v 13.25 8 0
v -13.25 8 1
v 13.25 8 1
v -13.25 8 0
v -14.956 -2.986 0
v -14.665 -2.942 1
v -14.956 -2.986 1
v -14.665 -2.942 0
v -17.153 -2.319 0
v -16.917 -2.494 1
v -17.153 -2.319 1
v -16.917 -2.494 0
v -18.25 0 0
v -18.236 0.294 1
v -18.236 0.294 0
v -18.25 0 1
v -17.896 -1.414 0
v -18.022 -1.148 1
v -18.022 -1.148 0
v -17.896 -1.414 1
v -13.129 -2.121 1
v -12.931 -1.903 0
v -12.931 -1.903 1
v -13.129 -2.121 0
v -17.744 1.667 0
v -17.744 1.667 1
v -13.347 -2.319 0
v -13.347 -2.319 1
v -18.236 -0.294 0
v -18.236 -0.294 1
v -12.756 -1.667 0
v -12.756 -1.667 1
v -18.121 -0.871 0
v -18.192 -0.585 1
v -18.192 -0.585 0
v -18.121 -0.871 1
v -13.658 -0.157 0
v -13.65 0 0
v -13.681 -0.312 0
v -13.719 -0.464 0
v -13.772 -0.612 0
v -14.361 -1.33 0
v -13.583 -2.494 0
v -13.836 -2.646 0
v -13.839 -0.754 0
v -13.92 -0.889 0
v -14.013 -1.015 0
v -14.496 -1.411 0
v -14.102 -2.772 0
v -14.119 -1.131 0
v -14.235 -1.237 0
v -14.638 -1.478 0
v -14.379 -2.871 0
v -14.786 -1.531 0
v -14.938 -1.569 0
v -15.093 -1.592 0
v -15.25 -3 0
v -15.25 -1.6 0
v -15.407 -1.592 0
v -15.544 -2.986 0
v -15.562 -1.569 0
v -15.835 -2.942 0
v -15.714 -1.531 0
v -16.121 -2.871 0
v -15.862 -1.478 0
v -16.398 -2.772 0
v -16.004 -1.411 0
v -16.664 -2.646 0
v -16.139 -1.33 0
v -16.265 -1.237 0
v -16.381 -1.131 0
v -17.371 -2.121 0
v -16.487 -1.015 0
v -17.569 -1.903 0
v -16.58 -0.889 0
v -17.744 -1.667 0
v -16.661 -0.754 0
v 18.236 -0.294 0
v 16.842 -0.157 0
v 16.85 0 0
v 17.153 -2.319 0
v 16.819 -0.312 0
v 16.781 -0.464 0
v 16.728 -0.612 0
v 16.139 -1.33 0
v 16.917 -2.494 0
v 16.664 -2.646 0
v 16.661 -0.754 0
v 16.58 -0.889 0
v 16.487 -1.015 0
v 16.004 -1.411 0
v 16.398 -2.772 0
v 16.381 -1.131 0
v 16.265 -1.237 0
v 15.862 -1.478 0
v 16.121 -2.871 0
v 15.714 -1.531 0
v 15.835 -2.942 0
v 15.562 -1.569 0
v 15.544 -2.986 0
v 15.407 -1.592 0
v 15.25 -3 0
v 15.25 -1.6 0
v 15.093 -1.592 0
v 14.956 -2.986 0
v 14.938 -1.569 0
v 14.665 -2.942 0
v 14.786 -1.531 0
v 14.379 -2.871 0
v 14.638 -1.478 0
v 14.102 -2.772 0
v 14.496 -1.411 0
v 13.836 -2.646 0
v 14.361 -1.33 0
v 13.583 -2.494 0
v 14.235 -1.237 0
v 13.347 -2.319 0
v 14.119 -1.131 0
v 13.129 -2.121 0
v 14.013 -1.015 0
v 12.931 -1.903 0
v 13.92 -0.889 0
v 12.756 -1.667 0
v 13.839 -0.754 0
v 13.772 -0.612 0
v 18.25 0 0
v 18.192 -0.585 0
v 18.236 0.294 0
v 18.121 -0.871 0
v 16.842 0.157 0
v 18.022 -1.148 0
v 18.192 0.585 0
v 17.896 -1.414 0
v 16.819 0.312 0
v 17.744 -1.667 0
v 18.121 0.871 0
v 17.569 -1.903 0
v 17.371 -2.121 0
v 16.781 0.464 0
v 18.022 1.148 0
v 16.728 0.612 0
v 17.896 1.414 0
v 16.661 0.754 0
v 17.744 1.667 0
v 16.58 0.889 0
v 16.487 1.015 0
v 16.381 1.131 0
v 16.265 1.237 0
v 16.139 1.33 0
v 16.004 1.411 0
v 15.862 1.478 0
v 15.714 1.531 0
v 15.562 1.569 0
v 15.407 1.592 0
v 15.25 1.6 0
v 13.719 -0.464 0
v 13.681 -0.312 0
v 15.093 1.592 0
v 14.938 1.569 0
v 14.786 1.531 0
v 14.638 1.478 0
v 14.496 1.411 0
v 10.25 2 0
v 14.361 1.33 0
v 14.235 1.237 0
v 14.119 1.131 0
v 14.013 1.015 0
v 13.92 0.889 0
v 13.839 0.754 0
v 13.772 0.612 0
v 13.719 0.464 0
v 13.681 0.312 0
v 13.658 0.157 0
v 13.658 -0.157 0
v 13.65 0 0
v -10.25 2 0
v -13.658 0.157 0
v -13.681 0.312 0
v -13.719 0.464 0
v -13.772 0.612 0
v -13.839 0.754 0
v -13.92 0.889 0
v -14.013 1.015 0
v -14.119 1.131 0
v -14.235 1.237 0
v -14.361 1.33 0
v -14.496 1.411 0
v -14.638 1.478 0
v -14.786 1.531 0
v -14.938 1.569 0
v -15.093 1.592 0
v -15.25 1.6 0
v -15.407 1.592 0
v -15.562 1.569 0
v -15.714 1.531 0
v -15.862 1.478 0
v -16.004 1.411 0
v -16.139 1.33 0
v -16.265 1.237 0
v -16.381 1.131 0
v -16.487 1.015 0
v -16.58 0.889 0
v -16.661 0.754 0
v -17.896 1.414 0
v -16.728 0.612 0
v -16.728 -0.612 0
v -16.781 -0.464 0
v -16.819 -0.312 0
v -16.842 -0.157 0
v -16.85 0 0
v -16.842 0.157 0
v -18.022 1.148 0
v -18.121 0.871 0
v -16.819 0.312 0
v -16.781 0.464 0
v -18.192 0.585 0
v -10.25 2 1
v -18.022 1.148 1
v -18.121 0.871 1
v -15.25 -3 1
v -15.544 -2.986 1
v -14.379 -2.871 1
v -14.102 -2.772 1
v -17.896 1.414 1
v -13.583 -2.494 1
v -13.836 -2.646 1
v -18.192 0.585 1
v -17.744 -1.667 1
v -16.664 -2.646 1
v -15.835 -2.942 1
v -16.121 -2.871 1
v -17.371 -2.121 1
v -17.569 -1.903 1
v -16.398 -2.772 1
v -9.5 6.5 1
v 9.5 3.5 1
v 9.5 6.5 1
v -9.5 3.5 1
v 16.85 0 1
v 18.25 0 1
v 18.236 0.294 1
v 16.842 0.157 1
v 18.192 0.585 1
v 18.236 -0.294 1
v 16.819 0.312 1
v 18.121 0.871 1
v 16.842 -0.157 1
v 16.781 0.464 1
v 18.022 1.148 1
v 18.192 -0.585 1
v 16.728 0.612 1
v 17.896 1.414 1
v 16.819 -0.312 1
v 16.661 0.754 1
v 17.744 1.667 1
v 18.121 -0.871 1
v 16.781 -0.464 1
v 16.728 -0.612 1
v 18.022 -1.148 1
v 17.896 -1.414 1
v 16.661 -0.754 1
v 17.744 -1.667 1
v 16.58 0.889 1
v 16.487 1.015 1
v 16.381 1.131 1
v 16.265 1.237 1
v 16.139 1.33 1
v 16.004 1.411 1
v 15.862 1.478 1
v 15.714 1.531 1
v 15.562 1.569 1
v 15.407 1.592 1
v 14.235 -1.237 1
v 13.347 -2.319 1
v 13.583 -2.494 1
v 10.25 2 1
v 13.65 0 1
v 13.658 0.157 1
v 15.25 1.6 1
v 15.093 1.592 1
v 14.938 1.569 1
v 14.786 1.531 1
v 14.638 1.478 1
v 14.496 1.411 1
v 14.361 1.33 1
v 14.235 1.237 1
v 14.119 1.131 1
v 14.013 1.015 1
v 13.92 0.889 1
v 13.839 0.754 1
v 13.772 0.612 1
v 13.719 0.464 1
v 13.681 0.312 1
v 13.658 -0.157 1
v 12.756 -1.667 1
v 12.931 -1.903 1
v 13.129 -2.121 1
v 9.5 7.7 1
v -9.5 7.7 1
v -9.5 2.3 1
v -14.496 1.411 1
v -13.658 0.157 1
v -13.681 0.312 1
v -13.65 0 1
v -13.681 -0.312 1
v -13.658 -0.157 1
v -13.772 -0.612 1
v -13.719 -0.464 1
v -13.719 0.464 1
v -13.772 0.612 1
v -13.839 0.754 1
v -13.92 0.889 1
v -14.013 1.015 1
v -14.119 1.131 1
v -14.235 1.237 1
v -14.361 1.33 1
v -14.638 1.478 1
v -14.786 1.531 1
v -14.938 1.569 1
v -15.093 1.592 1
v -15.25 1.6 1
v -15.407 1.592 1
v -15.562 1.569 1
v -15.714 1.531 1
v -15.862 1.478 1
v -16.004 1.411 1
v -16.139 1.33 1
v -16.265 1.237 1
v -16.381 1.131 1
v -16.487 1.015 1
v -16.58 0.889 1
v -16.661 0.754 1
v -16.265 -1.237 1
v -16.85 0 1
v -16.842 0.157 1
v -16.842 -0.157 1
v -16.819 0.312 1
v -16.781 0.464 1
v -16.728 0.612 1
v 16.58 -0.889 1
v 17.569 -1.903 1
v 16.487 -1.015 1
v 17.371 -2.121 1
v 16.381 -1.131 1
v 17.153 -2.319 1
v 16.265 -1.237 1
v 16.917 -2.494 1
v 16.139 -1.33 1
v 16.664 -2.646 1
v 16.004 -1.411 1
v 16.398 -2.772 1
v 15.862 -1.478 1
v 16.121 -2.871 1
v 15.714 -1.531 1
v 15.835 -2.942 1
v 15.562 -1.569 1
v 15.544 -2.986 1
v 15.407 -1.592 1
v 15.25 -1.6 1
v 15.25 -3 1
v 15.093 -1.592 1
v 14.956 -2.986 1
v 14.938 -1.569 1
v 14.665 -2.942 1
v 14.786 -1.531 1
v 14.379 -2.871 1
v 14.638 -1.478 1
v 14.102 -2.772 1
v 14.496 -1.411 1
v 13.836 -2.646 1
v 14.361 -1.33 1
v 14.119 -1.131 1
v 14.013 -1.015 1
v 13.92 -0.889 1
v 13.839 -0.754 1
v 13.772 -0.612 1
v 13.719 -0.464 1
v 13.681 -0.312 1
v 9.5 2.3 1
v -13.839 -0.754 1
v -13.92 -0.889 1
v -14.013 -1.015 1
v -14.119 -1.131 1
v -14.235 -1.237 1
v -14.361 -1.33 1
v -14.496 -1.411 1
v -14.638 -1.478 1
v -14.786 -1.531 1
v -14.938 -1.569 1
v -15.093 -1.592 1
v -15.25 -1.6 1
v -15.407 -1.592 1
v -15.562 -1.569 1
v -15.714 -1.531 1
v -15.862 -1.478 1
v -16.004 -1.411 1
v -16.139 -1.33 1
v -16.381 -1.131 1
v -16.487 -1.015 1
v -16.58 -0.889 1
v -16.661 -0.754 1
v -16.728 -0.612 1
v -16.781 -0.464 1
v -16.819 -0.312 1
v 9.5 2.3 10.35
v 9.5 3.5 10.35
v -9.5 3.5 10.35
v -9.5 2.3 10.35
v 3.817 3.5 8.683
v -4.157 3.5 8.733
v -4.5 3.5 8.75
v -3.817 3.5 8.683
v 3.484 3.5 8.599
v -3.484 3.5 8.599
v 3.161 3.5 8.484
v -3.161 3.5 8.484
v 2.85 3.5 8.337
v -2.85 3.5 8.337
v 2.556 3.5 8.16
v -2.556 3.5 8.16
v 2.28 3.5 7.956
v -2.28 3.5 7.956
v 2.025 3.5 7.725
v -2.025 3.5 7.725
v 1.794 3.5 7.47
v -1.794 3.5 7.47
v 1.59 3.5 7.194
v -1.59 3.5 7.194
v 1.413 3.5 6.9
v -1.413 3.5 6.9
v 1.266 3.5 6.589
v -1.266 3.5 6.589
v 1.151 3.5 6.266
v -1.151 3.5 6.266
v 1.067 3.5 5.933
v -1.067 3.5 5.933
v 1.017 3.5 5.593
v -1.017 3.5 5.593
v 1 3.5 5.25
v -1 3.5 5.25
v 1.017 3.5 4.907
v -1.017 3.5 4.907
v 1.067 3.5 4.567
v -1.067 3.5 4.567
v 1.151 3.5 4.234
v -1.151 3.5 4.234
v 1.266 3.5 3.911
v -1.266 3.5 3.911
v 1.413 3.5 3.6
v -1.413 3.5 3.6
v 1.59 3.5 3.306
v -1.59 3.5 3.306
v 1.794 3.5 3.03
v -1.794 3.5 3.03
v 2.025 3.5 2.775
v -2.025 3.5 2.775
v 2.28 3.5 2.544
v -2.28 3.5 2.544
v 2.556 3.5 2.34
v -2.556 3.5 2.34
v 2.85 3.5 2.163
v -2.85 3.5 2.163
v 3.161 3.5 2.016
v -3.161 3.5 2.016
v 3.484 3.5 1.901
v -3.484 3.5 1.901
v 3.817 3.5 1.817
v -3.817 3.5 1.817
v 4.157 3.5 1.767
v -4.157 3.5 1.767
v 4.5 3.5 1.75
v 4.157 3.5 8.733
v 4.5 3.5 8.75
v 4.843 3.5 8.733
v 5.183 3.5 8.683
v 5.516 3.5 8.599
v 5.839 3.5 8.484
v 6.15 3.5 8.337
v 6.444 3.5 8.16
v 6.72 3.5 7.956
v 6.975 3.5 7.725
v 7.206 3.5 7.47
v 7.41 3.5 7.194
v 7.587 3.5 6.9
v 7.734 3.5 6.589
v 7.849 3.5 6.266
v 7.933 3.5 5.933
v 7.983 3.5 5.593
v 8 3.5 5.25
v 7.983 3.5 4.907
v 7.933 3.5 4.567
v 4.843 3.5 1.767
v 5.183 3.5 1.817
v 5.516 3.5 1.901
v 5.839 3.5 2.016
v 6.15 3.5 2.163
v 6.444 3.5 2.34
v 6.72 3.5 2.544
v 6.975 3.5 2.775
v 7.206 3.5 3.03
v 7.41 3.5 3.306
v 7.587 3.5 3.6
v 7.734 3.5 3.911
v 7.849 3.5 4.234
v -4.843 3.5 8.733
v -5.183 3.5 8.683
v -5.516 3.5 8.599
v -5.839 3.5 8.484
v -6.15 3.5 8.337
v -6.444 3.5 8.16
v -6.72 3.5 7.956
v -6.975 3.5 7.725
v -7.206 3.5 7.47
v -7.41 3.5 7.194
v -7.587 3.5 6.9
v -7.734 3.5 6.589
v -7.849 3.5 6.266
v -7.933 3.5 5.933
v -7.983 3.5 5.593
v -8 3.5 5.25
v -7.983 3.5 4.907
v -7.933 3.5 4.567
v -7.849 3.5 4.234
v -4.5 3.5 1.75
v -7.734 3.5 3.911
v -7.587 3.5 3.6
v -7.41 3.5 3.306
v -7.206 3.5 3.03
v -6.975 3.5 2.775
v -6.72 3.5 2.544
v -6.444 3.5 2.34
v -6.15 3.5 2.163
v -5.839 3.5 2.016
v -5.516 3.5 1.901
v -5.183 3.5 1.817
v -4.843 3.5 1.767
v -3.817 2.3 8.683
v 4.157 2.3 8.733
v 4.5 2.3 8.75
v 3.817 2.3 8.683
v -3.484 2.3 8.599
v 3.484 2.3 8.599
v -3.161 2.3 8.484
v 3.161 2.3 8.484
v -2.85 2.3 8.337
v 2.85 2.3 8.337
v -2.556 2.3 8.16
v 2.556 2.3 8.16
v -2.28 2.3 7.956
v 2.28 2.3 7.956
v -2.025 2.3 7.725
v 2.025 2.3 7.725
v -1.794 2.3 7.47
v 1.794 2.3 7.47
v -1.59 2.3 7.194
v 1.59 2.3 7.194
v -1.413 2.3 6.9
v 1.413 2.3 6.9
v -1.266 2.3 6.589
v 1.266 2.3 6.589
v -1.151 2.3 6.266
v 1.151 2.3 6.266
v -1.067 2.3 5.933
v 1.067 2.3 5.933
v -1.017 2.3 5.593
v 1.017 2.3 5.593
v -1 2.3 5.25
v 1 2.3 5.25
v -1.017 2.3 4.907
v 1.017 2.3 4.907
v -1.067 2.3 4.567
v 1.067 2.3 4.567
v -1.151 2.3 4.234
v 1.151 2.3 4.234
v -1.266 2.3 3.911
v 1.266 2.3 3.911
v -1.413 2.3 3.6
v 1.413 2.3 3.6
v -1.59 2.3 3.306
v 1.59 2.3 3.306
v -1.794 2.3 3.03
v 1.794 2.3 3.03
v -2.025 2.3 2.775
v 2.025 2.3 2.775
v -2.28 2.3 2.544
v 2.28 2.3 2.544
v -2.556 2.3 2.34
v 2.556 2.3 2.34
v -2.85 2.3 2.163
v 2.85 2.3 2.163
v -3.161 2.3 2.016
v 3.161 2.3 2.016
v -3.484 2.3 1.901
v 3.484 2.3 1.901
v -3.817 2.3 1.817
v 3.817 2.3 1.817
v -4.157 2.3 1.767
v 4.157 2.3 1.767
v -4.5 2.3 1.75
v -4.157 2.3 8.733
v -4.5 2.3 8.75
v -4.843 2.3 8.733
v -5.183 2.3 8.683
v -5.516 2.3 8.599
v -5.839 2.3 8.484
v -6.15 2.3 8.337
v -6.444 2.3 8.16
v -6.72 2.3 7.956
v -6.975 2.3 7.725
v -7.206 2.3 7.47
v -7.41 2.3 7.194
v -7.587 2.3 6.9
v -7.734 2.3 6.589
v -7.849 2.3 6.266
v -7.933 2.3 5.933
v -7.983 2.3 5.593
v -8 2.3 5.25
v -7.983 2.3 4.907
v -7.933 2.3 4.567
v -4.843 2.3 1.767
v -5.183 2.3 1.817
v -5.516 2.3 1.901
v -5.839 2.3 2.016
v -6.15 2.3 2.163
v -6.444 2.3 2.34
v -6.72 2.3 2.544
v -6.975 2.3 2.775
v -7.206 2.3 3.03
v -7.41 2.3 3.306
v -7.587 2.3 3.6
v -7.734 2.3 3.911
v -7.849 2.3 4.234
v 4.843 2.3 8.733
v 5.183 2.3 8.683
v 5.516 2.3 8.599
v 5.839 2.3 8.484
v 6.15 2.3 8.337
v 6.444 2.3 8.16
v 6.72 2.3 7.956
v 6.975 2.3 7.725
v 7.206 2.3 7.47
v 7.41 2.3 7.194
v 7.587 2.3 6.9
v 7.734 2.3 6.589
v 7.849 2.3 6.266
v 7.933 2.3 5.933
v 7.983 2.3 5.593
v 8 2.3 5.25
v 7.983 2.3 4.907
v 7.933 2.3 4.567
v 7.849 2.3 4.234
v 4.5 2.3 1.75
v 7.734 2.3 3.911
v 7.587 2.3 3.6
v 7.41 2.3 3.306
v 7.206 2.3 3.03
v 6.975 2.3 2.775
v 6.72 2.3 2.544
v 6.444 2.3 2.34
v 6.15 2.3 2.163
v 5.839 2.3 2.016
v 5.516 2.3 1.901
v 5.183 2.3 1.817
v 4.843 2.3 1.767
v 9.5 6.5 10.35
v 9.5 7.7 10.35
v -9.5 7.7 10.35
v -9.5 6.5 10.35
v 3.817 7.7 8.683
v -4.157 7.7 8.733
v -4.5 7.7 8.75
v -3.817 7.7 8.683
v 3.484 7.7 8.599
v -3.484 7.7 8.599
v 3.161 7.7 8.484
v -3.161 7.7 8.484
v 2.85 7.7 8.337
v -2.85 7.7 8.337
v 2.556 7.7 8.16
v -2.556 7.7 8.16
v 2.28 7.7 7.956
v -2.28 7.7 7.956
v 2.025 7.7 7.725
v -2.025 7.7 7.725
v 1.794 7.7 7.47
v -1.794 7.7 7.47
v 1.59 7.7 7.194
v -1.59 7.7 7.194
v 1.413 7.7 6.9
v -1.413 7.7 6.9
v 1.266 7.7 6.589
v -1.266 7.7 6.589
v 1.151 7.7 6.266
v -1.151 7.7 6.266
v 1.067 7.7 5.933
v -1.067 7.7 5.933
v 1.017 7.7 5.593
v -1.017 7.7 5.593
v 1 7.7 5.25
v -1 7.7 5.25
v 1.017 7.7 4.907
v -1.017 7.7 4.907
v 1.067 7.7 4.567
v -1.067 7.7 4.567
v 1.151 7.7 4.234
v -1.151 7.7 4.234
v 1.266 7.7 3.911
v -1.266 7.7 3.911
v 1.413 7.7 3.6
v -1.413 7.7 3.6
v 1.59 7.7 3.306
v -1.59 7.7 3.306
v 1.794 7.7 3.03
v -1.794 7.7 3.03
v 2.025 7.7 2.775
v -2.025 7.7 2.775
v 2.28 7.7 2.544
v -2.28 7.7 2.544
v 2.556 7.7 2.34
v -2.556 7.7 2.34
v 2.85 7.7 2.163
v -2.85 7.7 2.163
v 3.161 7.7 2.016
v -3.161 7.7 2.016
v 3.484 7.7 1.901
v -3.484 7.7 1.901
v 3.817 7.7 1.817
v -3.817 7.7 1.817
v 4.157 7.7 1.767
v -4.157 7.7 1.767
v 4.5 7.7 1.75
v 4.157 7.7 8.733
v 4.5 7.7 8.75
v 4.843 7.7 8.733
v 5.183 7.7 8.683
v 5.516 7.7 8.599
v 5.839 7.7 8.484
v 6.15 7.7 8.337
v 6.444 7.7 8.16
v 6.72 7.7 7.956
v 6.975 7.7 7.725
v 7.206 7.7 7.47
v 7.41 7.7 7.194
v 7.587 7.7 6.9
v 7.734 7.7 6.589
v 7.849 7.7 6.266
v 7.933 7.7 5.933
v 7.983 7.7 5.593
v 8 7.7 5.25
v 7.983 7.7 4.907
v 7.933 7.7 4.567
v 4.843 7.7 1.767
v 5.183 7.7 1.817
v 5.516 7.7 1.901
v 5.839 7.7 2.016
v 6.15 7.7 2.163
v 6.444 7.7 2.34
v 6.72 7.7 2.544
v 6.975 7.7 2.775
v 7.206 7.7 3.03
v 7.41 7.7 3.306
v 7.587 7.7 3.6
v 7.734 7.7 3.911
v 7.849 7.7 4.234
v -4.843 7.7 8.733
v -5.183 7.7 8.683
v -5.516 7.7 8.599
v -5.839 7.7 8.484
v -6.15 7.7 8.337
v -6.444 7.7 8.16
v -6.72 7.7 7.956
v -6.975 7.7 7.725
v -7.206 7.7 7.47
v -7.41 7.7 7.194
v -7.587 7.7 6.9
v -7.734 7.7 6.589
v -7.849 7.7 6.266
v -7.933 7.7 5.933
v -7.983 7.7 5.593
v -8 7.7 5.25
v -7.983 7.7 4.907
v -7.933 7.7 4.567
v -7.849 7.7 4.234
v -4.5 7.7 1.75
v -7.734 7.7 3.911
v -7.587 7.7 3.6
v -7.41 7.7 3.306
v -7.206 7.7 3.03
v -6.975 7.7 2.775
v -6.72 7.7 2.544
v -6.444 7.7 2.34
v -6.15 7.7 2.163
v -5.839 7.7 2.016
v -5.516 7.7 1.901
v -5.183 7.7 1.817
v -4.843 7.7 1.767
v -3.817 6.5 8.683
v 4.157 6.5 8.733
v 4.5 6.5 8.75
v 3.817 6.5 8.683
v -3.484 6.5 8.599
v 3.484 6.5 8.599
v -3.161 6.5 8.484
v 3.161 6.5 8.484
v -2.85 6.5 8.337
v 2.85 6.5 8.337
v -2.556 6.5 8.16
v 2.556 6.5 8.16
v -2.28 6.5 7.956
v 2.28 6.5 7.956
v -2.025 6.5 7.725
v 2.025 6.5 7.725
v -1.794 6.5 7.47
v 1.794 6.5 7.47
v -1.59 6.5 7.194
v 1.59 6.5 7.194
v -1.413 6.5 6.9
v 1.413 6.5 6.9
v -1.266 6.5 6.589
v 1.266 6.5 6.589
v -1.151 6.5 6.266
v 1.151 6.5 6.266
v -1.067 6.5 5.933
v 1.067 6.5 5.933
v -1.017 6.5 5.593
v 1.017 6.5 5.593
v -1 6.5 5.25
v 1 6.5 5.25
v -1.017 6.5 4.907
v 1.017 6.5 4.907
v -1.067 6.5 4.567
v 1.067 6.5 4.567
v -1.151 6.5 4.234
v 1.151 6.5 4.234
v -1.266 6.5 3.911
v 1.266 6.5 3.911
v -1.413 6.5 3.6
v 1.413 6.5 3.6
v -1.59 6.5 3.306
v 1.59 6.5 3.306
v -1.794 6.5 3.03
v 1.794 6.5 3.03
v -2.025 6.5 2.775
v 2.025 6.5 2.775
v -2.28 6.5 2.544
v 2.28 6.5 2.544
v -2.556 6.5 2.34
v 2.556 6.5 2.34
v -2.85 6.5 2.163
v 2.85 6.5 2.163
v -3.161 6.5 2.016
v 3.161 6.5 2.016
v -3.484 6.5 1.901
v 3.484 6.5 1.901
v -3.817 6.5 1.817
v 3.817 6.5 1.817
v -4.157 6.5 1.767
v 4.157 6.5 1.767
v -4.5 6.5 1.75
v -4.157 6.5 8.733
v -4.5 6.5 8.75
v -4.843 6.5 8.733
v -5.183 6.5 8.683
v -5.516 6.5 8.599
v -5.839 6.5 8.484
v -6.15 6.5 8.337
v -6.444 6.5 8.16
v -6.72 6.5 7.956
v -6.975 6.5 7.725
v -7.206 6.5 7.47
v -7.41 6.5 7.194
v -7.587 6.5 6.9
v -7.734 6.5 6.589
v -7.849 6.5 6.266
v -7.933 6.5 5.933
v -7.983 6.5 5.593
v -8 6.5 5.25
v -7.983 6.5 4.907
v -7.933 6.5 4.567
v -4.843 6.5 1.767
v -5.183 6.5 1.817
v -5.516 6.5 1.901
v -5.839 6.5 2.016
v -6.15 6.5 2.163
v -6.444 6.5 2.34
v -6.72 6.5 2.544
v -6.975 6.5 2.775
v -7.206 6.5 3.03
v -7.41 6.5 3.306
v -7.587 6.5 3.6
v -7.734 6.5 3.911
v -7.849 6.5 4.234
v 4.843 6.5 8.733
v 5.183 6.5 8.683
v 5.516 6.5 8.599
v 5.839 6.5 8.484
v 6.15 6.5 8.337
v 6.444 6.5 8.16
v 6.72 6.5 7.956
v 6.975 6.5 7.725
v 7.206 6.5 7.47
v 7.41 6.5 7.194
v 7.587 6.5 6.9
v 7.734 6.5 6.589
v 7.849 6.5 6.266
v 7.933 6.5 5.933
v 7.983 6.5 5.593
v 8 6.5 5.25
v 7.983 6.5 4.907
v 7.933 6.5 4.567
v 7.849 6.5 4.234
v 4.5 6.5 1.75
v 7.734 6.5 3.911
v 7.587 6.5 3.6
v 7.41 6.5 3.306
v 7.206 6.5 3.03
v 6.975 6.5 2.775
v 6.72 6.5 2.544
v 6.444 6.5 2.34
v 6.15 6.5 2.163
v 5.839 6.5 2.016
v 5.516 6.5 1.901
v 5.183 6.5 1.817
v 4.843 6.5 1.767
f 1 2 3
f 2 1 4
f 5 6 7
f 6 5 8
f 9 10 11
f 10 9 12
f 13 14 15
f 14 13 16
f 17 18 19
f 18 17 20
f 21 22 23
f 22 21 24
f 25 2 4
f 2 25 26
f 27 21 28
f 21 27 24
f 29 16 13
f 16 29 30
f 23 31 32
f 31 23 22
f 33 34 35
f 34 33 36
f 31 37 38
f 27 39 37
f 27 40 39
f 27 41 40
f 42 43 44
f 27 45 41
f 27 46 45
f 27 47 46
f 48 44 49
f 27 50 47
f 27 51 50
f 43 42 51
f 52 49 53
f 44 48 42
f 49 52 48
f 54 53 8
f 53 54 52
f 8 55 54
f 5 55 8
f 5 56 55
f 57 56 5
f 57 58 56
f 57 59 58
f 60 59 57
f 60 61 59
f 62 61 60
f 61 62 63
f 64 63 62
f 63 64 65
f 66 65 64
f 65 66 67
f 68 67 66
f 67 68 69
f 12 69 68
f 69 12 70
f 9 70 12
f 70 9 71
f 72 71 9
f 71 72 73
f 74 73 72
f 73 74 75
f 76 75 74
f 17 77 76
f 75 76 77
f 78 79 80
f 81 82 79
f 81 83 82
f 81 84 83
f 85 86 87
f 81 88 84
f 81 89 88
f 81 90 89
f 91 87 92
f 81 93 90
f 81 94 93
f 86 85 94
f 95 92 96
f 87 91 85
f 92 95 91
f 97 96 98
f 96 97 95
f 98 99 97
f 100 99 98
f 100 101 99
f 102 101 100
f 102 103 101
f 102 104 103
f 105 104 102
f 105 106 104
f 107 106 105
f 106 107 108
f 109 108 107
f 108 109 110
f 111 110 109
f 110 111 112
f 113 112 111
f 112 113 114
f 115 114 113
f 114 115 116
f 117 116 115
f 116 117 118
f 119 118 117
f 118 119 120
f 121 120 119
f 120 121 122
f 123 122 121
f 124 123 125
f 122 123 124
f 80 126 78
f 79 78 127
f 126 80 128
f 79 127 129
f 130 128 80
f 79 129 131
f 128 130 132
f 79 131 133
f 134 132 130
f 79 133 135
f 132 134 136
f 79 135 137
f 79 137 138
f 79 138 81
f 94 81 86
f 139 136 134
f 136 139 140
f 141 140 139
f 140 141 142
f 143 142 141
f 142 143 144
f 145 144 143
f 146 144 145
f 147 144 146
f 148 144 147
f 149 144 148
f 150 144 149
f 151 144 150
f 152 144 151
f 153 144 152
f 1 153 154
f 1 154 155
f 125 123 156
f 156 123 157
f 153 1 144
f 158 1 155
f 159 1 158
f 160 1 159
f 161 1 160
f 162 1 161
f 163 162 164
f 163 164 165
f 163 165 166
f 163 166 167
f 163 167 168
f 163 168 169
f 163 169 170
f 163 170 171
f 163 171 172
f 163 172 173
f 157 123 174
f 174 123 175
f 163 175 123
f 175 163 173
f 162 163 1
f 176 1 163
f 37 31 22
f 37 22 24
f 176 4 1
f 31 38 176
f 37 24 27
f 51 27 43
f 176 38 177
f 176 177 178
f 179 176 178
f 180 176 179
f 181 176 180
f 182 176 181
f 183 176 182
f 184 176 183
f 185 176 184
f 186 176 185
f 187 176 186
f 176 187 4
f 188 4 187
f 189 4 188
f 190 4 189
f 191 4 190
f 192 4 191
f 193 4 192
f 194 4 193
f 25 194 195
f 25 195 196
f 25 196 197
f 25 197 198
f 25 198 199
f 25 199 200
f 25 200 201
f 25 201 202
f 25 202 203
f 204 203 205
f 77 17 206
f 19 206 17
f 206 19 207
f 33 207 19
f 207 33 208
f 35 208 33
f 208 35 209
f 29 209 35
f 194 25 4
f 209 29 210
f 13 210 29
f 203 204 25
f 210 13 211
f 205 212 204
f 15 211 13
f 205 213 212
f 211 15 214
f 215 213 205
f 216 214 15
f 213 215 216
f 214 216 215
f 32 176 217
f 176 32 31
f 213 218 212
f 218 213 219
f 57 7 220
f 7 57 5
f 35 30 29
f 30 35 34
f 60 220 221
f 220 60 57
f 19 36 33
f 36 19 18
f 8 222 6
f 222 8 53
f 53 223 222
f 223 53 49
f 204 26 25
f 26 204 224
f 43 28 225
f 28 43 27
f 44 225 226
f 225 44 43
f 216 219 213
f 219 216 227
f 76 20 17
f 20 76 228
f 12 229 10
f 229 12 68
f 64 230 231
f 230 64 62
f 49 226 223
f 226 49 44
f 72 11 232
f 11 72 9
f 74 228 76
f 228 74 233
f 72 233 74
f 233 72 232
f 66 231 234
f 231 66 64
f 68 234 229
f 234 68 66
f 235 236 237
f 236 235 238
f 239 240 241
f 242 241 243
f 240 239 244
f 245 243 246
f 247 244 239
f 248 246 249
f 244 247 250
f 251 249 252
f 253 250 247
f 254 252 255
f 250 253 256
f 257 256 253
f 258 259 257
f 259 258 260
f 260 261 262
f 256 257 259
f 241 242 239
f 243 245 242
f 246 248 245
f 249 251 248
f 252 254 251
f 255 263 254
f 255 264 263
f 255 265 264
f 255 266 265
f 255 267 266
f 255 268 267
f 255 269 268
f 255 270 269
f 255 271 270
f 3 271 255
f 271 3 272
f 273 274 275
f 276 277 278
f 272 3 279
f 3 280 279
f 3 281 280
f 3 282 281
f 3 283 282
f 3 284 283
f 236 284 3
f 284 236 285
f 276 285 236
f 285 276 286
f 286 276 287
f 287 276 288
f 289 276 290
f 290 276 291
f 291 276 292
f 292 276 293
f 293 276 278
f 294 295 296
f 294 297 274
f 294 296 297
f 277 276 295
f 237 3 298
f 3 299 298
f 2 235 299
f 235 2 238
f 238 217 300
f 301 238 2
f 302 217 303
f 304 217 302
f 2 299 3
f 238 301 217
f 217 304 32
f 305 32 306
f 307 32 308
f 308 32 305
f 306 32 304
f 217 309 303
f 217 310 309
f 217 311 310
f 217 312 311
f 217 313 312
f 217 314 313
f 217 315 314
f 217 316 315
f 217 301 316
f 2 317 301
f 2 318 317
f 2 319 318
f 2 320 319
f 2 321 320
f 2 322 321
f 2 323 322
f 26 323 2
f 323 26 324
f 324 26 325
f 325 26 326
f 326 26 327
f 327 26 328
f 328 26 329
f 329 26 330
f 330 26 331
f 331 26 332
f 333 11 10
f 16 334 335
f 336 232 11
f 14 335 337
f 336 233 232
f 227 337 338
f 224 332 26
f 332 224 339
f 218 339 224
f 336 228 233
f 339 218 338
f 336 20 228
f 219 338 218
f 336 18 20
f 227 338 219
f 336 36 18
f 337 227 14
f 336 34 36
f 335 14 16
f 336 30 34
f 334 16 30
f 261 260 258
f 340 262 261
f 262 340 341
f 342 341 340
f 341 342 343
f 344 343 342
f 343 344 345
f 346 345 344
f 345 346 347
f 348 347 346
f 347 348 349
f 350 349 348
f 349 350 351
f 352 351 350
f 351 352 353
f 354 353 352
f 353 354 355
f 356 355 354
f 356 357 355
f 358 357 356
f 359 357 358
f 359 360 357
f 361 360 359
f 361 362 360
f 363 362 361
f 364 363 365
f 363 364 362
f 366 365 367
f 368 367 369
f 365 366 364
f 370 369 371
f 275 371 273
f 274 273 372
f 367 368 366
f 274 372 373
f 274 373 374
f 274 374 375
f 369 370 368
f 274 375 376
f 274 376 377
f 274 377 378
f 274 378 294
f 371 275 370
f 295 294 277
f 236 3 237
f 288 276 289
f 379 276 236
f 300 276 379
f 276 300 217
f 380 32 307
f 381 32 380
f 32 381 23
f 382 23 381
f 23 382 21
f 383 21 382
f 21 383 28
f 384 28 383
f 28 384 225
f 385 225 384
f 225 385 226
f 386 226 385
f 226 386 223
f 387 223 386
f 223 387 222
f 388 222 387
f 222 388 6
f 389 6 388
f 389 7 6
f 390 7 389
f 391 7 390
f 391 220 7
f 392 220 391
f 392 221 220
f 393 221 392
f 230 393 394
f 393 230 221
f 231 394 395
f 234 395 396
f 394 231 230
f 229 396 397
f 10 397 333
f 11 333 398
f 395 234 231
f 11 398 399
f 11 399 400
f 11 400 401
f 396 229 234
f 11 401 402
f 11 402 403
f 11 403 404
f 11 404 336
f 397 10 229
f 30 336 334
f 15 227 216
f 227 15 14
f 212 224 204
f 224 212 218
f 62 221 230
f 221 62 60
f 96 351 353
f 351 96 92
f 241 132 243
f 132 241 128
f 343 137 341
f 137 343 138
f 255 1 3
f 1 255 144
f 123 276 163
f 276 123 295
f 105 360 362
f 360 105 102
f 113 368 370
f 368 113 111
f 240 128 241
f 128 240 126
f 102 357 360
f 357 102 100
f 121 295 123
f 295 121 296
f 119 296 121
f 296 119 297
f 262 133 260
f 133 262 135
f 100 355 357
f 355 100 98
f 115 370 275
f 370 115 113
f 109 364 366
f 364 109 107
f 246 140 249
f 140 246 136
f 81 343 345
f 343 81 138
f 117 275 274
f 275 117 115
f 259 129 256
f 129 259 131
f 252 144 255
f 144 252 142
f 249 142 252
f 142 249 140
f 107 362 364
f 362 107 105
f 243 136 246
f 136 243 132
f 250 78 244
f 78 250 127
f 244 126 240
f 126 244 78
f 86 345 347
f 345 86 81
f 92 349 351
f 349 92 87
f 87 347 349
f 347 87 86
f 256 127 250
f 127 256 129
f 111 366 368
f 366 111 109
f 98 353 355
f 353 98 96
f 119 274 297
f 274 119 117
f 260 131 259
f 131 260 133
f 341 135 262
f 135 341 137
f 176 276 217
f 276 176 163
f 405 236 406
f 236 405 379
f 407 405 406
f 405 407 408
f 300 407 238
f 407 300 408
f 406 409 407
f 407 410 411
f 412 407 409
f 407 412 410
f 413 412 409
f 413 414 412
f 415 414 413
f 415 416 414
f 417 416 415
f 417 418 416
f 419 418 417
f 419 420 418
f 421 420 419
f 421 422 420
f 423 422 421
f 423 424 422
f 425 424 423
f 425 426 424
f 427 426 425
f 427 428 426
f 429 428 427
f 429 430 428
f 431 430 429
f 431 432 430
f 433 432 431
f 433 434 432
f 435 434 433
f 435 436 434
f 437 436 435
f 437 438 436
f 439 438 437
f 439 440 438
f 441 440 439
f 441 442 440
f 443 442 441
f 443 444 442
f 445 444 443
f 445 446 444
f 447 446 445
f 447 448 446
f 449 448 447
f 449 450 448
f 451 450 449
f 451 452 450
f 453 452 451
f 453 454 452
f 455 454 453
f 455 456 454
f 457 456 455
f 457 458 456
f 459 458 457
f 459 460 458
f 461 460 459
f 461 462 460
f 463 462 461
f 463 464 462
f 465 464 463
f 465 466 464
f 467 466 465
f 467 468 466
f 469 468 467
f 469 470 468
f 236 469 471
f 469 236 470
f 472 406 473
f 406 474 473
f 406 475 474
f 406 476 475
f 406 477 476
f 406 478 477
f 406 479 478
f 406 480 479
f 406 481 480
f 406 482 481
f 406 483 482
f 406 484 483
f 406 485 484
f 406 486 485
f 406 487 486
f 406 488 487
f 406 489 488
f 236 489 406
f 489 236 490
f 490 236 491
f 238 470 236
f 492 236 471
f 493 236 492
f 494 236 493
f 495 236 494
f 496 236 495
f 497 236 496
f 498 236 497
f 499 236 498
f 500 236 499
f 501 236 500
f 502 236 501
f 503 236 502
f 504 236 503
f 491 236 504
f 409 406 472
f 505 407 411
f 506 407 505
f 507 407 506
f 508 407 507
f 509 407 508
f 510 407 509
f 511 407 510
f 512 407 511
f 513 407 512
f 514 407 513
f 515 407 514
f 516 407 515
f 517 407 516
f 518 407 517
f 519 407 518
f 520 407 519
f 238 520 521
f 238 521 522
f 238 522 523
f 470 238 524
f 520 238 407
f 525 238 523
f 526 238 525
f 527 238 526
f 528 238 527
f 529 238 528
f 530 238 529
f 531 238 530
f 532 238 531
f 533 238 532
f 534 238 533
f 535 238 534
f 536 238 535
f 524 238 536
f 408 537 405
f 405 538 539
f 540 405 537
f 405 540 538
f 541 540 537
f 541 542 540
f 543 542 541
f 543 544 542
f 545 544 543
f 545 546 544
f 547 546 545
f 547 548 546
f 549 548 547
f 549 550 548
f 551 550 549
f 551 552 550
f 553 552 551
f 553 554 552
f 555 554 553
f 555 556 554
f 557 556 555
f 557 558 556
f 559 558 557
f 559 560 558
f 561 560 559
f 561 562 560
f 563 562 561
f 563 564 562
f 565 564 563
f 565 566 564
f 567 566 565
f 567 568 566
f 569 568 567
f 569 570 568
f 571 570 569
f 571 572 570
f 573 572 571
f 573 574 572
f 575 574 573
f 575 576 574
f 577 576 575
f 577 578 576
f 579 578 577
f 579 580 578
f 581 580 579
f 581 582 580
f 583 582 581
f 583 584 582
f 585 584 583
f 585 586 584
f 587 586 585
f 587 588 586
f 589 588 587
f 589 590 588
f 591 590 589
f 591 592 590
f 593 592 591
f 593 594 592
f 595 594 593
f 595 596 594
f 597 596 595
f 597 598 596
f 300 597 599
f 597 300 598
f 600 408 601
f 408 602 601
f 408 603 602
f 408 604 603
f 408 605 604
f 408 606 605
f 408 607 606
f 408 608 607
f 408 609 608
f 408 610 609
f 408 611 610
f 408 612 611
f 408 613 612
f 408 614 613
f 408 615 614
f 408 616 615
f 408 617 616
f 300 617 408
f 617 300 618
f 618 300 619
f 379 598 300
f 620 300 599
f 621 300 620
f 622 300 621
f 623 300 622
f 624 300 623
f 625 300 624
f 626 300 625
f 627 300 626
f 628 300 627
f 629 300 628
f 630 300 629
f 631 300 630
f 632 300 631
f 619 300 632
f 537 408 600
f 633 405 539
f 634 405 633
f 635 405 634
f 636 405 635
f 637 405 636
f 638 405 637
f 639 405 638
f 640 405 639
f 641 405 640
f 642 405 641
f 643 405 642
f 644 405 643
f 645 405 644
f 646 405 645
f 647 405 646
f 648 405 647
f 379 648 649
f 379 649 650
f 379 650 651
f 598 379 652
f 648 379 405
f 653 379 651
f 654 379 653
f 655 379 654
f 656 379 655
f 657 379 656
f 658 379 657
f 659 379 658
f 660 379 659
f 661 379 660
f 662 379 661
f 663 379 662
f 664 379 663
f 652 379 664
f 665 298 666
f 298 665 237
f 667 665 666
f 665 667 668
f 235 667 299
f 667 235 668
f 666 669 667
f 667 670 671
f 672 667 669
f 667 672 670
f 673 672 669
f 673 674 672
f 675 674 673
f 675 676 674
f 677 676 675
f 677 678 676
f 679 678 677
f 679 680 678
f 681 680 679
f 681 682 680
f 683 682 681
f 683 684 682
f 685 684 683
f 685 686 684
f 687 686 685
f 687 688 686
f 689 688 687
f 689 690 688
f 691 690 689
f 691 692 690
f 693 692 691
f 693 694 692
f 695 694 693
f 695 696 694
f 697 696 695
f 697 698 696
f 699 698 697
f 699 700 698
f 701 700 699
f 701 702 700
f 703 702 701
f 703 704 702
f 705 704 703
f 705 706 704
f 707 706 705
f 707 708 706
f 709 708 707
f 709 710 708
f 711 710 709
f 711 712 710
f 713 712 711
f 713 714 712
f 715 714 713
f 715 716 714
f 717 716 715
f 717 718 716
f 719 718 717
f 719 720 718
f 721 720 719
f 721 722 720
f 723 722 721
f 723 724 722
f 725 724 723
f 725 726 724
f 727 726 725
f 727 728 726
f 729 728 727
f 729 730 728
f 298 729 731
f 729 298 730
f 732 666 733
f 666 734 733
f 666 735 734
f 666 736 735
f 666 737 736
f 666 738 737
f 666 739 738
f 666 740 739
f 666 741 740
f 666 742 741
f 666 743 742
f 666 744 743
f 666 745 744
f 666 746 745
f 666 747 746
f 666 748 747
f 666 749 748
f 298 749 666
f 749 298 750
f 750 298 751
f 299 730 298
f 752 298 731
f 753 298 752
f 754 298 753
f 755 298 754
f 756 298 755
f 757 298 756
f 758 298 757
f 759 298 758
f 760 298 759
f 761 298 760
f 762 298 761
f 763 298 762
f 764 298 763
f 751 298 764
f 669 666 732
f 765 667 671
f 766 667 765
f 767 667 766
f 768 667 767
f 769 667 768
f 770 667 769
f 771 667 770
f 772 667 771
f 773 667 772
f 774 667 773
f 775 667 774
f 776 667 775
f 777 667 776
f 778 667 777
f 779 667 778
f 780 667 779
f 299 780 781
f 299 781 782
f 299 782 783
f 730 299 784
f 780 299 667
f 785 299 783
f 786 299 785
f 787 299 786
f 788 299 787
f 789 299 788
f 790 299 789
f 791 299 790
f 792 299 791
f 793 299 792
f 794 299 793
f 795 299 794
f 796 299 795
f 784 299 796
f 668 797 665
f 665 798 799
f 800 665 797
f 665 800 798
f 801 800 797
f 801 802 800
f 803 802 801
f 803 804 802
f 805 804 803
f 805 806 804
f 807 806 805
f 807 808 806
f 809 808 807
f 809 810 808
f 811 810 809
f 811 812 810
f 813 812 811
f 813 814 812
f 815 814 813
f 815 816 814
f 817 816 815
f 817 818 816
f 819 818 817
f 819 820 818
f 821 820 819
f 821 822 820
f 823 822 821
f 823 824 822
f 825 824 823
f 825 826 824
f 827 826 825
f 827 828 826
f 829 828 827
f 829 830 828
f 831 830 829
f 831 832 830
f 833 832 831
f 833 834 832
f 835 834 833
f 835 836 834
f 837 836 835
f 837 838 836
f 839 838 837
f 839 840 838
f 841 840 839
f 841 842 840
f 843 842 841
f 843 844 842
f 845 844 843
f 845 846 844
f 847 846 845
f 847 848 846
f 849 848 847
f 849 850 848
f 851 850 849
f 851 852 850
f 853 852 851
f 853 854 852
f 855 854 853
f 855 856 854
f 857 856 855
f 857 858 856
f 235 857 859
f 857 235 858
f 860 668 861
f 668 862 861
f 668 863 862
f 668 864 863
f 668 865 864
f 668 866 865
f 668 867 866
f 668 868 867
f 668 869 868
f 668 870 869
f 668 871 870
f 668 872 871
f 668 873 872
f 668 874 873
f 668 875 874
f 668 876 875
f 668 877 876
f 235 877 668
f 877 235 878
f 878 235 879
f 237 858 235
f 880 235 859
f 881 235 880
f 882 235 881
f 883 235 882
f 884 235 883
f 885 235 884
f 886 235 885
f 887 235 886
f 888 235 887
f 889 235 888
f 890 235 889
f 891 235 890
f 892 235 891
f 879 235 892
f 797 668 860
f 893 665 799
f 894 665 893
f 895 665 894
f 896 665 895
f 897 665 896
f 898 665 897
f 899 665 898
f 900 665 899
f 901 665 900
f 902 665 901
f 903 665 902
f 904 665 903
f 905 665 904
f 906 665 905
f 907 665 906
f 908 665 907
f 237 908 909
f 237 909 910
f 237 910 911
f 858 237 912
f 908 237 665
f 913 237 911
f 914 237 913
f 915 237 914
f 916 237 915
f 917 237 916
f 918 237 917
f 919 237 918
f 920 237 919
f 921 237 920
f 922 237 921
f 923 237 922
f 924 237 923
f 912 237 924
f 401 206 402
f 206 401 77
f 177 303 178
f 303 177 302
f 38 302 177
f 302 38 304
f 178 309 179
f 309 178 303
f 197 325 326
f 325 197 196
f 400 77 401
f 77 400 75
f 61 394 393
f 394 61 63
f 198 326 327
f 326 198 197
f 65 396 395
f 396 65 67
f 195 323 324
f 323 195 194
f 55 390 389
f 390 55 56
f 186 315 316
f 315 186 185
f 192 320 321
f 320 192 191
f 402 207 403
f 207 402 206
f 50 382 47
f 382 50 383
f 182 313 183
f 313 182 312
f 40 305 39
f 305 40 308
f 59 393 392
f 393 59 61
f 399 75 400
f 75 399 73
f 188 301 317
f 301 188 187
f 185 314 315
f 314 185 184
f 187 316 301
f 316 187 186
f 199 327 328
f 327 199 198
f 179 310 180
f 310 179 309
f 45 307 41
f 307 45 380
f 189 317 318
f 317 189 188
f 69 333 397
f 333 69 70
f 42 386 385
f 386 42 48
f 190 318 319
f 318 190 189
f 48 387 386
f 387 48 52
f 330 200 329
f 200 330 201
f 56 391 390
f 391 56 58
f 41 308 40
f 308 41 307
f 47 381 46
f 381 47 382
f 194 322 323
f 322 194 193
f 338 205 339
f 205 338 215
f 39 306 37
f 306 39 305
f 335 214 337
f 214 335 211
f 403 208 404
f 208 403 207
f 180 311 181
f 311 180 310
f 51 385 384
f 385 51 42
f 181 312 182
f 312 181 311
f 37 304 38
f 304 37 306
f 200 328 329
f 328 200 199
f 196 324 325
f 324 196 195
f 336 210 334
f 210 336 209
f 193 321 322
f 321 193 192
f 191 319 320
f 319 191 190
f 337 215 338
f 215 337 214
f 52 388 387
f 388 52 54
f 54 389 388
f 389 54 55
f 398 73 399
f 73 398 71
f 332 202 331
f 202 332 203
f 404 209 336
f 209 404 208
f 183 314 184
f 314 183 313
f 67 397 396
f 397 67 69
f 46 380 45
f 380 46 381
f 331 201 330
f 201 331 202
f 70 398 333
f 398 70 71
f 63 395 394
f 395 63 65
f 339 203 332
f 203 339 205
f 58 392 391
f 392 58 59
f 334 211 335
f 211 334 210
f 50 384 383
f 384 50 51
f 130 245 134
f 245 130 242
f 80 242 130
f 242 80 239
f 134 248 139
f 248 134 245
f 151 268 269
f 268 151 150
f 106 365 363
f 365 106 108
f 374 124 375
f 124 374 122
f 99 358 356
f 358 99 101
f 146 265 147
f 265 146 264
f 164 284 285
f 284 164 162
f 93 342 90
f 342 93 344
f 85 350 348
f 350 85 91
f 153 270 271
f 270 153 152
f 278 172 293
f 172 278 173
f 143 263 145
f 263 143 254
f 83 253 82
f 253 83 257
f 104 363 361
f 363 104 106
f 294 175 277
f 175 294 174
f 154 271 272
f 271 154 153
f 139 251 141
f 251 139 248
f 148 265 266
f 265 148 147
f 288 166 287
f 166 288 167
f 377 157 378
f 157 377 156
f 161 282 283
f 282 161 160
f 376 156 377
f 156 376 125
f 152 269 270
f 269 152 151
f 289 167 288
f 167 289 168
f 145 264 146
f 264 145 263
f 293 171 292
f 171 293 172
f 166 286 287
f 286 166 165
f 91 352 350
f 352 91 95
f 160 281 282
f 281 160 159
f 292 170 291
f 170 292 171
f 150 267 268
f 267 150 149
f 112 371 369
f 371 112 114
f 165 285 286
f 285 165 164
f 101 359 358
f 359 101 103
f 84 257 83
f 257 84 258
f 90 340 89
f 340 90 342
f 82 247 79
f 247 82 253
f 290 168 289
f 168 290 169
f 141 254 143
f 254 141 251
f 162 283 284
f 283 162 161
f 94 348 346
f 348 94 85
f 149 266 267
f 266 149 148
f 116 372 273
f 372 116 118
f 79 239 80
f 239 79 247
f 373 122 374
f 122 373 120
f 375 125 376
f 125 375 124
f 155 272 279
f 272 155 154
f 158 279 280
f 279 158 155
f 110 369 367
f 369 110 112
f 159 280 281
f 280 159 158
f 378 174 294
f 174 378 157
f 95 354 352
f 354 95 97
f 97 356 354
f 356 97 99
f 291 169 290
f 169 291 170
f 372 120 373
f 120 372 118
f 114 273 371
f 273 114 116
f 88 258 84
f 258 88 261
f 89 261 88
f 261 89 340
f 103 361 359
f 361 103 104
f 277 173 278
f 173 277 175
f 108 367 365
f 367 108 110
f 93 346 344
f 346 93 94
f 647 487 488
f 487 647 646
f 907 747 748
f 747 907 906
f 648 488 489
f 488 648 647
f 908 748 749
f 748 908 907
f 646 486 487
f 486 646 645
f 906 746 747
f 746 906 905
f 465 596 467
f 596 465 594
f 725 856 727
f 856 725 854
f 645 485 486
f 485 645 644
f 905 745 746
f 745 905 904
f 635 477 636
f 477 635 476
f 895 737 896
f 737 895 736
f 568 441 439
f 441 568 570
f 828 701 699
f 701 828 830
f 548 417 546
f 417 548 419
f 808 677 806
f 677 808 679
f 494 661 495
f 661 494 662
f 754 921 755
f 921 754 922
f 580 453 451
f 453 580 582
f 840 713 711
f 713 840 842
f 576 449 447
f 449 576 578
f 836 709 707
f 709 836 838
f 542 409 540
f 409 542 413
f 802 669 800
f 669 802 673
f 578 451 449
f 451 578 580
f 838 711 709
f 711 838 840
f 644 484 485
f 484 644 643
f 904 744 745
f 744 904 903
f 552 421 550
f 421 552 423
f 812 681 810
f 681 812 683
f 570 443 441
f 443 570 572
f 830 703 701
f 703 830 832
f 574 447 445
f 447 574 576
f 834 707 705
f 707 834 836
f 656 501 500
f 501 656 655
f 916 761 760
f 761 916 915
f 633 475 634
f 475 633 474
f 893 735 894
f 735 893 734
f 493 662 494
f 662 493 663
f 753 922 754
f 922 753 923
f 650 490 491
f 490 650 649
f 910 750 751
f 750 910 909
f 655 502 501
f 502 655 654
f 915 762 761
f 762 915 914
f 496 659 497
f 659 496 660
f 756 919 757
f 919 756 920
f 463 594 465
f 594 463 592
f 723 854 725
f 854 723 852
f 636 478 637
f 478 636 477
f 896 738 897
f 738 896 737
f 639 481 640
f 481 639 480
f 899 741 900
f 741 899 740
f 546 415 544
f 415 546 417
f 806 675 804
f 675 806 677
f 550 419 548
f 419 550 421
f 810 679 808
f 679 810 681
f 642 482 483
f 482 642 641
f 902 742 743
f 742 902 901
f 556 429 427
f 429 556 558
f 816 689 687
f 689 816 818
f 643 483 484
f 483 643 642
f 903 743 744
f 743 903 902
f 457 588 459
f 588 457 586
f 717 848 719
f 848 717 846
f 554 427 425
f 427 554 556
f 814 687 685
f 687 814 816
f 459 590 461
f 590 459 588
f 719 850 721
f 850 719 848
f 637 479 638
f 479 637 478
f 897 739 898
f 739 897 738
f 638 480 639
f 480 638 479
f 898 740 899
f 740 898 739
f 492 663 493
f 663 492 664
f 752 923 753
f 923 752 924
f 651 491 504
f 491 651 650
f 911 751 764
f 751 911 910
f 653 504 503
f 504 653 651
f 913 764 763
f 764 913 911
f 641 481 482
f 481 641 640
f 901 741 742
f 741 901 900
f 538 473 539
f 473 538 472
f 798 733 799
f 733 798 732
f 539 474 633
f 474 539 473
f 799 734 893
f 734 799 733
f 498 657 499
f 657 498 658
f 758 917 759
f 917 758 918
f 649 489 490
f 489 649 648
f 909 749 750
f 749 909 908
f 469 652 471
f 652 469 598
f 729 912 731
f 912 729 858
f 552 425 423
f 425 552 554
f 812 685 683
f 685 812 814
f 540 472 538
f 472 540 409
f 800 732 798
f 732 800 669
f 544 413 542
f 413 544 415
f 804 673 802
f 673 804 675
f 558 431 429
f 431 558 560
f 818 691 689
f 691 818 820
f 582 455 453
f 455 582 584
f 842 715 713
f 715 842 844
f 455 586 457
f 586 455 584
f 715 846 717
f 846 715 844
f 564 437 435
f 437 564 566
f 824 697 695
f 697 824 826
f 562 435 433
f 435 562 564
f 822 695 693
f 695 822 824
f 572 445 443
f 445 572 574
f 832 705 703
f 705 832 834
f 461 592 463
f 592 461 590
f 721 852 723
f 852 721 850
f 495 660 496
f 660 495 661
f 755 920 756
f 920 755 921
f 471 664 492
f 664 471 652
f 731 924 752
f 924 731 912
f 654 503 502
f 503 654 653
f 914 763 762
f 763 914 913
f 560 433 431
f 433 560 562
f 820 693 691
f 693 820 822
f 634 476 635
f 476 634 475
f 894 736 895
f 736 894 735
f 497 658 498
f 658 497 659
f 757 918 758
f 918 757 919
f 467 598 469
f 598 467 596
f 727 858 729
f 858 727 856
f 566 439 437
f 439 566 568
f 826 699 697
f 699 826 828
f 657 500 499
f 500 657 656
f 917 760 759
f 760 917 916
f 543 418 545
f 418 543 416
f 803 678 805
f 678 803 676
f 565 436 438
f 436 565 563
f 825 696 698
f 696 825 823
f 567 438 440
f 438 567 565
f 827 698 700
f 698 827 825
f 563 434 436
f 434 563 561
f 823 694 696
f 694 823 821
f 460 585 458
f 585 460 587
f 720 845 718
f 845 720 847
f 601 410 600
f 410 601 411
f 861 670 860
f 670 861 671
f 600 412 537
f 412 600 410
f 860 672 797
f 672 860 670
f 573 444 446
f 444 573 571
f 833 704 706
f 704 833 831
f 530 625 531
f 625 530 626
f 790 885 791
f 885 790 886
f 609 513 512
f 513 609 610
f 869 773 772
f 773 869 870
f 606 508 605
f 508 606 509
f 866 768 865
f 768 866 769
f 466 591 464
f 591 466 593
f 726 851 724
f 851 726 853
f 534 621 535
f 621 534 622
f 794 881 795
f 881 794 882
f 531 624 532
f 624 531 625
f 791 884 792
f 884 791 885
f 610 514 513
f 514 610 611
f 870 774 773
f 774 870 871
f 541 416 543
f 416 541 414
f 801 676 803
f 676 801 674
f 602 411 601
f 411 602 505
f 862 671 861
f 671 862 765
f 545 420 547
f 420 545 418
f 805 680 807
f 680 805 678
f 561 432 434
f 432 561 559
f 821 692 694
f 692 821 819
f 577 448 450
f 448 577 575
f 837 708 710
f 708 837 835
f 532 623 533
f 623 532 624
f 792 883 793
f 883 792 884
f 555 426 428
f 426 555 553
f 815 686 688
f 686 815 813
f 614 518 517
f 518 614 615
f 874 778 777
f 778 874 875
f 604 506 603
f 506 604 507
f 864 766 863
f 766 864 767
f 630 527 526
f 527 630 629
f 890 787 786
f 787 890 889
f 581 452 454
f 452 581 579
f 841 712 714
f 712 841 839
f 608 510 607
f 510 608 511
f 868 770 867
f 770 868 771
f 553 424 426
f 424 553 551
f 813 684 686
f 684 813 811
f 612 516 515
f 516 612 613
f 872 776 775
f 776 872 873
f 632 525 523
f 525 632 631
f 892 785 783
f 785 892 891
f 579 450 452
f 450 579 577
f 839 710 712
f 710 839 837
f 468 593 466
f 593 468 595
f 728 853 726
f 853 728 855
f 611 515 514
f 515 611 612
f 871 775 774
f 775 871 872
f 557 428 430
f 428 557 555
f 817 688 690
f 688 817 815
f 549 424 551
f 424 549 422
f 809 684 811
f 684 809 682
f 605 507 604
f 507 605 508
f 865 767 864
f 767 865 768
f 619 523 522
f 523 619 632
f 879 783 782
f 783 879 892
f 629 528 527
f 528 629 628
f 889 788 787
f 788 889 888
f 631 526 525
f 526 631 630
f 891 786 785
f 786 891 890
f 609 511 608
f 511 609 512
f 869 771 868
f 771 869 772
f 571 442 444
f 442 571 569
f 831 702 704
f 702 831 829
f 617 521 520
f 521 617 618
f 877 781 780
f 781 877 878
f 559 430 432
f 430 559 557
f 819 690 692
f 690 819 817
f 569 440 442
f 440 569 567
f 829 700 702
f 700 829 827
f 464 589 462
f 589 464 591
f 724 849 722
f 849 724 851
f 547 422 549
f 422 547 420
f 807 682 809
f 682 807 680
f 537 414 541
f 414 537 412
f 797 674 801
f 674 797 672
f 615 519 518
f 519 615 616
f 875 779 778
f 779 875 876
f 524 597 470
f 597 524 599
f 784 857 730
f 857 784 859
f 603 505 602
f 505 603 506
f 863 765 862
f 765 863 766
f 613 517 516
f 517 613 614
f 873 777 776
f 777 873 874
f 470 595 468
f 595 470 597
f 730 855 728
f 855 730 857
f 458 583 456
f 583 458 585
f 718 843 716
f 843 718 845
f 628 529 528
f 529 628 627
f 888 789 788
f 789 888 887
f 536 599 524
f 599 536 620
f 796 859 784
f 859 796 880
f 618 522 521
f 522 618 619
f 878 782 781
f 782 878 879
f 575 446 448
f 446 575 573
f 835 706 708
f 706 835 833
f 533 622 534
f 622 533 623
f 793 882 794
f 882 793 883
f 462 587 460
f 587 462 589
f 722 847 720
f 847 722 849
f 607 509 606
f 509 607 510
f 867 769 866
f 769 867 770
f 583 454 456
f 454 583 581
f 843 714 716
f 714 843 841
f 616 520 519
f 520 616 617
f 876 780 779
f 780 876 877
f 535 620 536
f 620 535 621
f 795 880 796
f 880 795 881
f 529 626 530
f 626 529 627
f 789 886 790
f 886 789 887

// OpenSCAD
plate_height = 1;
screw_hole = 3.2;
hole_spacing = 30.5;
bec_length = 15 + 4;
bec_height = 8.5;
bec_thickness = 3;
wall_thickness = 1.2;
strut_width = 6;

$fn = 64;

difference() {
    union() {
        hull() {
            translate([-hole_spacing/2, 0, 0]) cylinder(d = 6, h = plate_height);
            translate([-hole_spacing/2 + 2, 2, 0]) cube([3, strut_width, plate_height]);
        }
        hull() {
            translate([hole_spacing/2, 0, 0]) cylinder(d = 6, h = plate_height);
            translate([hole_spacing/2 - 5, 2, 0]) cube([3, strut_width, plate_height]);
        }
        translate([-12.5, 2, 0]) cube([25, strut_width, plate_height]);
        
        // bec mount
        edge_offset = (6 - bec_thickness - 2 * wall_thickness) / 2;
        translate([-bec_length/2, 2 + edge_offset, plate_height]) cube([bec_length, 1.2, bec_height * 1.1]);
        translate([-bec_length/2, 2+ edge_offset + wall_thickness + bec_thickness, plate_height]) cube([bec_length, 1.2, bec_height * 1.1]);
    
    }
    
    // screw holes
    translate([-hole_spacing/2, 0, -0.1]) cylinder(d = screw_hole, h = plate_height + 0.2);
    translate([hole_spacing/2, 0, -0.1]) cylinder(d = screw_hole, h = plate_height + 0.2);
    
    // weight reduction / air vents
    translate([bec_length / 2 - 5, 3 + strut_width, bec_height / 2 + plate_height]) rotate([90, 0, 0]) cylinder(d = 7, h = 8);    
    translate([-bec_length / 2 + 5, 3 + strut_width, bec_height / 2 + plate_height]) rotate([90, 0, 0]) cylinder(d = 7, h = 8);    
}
